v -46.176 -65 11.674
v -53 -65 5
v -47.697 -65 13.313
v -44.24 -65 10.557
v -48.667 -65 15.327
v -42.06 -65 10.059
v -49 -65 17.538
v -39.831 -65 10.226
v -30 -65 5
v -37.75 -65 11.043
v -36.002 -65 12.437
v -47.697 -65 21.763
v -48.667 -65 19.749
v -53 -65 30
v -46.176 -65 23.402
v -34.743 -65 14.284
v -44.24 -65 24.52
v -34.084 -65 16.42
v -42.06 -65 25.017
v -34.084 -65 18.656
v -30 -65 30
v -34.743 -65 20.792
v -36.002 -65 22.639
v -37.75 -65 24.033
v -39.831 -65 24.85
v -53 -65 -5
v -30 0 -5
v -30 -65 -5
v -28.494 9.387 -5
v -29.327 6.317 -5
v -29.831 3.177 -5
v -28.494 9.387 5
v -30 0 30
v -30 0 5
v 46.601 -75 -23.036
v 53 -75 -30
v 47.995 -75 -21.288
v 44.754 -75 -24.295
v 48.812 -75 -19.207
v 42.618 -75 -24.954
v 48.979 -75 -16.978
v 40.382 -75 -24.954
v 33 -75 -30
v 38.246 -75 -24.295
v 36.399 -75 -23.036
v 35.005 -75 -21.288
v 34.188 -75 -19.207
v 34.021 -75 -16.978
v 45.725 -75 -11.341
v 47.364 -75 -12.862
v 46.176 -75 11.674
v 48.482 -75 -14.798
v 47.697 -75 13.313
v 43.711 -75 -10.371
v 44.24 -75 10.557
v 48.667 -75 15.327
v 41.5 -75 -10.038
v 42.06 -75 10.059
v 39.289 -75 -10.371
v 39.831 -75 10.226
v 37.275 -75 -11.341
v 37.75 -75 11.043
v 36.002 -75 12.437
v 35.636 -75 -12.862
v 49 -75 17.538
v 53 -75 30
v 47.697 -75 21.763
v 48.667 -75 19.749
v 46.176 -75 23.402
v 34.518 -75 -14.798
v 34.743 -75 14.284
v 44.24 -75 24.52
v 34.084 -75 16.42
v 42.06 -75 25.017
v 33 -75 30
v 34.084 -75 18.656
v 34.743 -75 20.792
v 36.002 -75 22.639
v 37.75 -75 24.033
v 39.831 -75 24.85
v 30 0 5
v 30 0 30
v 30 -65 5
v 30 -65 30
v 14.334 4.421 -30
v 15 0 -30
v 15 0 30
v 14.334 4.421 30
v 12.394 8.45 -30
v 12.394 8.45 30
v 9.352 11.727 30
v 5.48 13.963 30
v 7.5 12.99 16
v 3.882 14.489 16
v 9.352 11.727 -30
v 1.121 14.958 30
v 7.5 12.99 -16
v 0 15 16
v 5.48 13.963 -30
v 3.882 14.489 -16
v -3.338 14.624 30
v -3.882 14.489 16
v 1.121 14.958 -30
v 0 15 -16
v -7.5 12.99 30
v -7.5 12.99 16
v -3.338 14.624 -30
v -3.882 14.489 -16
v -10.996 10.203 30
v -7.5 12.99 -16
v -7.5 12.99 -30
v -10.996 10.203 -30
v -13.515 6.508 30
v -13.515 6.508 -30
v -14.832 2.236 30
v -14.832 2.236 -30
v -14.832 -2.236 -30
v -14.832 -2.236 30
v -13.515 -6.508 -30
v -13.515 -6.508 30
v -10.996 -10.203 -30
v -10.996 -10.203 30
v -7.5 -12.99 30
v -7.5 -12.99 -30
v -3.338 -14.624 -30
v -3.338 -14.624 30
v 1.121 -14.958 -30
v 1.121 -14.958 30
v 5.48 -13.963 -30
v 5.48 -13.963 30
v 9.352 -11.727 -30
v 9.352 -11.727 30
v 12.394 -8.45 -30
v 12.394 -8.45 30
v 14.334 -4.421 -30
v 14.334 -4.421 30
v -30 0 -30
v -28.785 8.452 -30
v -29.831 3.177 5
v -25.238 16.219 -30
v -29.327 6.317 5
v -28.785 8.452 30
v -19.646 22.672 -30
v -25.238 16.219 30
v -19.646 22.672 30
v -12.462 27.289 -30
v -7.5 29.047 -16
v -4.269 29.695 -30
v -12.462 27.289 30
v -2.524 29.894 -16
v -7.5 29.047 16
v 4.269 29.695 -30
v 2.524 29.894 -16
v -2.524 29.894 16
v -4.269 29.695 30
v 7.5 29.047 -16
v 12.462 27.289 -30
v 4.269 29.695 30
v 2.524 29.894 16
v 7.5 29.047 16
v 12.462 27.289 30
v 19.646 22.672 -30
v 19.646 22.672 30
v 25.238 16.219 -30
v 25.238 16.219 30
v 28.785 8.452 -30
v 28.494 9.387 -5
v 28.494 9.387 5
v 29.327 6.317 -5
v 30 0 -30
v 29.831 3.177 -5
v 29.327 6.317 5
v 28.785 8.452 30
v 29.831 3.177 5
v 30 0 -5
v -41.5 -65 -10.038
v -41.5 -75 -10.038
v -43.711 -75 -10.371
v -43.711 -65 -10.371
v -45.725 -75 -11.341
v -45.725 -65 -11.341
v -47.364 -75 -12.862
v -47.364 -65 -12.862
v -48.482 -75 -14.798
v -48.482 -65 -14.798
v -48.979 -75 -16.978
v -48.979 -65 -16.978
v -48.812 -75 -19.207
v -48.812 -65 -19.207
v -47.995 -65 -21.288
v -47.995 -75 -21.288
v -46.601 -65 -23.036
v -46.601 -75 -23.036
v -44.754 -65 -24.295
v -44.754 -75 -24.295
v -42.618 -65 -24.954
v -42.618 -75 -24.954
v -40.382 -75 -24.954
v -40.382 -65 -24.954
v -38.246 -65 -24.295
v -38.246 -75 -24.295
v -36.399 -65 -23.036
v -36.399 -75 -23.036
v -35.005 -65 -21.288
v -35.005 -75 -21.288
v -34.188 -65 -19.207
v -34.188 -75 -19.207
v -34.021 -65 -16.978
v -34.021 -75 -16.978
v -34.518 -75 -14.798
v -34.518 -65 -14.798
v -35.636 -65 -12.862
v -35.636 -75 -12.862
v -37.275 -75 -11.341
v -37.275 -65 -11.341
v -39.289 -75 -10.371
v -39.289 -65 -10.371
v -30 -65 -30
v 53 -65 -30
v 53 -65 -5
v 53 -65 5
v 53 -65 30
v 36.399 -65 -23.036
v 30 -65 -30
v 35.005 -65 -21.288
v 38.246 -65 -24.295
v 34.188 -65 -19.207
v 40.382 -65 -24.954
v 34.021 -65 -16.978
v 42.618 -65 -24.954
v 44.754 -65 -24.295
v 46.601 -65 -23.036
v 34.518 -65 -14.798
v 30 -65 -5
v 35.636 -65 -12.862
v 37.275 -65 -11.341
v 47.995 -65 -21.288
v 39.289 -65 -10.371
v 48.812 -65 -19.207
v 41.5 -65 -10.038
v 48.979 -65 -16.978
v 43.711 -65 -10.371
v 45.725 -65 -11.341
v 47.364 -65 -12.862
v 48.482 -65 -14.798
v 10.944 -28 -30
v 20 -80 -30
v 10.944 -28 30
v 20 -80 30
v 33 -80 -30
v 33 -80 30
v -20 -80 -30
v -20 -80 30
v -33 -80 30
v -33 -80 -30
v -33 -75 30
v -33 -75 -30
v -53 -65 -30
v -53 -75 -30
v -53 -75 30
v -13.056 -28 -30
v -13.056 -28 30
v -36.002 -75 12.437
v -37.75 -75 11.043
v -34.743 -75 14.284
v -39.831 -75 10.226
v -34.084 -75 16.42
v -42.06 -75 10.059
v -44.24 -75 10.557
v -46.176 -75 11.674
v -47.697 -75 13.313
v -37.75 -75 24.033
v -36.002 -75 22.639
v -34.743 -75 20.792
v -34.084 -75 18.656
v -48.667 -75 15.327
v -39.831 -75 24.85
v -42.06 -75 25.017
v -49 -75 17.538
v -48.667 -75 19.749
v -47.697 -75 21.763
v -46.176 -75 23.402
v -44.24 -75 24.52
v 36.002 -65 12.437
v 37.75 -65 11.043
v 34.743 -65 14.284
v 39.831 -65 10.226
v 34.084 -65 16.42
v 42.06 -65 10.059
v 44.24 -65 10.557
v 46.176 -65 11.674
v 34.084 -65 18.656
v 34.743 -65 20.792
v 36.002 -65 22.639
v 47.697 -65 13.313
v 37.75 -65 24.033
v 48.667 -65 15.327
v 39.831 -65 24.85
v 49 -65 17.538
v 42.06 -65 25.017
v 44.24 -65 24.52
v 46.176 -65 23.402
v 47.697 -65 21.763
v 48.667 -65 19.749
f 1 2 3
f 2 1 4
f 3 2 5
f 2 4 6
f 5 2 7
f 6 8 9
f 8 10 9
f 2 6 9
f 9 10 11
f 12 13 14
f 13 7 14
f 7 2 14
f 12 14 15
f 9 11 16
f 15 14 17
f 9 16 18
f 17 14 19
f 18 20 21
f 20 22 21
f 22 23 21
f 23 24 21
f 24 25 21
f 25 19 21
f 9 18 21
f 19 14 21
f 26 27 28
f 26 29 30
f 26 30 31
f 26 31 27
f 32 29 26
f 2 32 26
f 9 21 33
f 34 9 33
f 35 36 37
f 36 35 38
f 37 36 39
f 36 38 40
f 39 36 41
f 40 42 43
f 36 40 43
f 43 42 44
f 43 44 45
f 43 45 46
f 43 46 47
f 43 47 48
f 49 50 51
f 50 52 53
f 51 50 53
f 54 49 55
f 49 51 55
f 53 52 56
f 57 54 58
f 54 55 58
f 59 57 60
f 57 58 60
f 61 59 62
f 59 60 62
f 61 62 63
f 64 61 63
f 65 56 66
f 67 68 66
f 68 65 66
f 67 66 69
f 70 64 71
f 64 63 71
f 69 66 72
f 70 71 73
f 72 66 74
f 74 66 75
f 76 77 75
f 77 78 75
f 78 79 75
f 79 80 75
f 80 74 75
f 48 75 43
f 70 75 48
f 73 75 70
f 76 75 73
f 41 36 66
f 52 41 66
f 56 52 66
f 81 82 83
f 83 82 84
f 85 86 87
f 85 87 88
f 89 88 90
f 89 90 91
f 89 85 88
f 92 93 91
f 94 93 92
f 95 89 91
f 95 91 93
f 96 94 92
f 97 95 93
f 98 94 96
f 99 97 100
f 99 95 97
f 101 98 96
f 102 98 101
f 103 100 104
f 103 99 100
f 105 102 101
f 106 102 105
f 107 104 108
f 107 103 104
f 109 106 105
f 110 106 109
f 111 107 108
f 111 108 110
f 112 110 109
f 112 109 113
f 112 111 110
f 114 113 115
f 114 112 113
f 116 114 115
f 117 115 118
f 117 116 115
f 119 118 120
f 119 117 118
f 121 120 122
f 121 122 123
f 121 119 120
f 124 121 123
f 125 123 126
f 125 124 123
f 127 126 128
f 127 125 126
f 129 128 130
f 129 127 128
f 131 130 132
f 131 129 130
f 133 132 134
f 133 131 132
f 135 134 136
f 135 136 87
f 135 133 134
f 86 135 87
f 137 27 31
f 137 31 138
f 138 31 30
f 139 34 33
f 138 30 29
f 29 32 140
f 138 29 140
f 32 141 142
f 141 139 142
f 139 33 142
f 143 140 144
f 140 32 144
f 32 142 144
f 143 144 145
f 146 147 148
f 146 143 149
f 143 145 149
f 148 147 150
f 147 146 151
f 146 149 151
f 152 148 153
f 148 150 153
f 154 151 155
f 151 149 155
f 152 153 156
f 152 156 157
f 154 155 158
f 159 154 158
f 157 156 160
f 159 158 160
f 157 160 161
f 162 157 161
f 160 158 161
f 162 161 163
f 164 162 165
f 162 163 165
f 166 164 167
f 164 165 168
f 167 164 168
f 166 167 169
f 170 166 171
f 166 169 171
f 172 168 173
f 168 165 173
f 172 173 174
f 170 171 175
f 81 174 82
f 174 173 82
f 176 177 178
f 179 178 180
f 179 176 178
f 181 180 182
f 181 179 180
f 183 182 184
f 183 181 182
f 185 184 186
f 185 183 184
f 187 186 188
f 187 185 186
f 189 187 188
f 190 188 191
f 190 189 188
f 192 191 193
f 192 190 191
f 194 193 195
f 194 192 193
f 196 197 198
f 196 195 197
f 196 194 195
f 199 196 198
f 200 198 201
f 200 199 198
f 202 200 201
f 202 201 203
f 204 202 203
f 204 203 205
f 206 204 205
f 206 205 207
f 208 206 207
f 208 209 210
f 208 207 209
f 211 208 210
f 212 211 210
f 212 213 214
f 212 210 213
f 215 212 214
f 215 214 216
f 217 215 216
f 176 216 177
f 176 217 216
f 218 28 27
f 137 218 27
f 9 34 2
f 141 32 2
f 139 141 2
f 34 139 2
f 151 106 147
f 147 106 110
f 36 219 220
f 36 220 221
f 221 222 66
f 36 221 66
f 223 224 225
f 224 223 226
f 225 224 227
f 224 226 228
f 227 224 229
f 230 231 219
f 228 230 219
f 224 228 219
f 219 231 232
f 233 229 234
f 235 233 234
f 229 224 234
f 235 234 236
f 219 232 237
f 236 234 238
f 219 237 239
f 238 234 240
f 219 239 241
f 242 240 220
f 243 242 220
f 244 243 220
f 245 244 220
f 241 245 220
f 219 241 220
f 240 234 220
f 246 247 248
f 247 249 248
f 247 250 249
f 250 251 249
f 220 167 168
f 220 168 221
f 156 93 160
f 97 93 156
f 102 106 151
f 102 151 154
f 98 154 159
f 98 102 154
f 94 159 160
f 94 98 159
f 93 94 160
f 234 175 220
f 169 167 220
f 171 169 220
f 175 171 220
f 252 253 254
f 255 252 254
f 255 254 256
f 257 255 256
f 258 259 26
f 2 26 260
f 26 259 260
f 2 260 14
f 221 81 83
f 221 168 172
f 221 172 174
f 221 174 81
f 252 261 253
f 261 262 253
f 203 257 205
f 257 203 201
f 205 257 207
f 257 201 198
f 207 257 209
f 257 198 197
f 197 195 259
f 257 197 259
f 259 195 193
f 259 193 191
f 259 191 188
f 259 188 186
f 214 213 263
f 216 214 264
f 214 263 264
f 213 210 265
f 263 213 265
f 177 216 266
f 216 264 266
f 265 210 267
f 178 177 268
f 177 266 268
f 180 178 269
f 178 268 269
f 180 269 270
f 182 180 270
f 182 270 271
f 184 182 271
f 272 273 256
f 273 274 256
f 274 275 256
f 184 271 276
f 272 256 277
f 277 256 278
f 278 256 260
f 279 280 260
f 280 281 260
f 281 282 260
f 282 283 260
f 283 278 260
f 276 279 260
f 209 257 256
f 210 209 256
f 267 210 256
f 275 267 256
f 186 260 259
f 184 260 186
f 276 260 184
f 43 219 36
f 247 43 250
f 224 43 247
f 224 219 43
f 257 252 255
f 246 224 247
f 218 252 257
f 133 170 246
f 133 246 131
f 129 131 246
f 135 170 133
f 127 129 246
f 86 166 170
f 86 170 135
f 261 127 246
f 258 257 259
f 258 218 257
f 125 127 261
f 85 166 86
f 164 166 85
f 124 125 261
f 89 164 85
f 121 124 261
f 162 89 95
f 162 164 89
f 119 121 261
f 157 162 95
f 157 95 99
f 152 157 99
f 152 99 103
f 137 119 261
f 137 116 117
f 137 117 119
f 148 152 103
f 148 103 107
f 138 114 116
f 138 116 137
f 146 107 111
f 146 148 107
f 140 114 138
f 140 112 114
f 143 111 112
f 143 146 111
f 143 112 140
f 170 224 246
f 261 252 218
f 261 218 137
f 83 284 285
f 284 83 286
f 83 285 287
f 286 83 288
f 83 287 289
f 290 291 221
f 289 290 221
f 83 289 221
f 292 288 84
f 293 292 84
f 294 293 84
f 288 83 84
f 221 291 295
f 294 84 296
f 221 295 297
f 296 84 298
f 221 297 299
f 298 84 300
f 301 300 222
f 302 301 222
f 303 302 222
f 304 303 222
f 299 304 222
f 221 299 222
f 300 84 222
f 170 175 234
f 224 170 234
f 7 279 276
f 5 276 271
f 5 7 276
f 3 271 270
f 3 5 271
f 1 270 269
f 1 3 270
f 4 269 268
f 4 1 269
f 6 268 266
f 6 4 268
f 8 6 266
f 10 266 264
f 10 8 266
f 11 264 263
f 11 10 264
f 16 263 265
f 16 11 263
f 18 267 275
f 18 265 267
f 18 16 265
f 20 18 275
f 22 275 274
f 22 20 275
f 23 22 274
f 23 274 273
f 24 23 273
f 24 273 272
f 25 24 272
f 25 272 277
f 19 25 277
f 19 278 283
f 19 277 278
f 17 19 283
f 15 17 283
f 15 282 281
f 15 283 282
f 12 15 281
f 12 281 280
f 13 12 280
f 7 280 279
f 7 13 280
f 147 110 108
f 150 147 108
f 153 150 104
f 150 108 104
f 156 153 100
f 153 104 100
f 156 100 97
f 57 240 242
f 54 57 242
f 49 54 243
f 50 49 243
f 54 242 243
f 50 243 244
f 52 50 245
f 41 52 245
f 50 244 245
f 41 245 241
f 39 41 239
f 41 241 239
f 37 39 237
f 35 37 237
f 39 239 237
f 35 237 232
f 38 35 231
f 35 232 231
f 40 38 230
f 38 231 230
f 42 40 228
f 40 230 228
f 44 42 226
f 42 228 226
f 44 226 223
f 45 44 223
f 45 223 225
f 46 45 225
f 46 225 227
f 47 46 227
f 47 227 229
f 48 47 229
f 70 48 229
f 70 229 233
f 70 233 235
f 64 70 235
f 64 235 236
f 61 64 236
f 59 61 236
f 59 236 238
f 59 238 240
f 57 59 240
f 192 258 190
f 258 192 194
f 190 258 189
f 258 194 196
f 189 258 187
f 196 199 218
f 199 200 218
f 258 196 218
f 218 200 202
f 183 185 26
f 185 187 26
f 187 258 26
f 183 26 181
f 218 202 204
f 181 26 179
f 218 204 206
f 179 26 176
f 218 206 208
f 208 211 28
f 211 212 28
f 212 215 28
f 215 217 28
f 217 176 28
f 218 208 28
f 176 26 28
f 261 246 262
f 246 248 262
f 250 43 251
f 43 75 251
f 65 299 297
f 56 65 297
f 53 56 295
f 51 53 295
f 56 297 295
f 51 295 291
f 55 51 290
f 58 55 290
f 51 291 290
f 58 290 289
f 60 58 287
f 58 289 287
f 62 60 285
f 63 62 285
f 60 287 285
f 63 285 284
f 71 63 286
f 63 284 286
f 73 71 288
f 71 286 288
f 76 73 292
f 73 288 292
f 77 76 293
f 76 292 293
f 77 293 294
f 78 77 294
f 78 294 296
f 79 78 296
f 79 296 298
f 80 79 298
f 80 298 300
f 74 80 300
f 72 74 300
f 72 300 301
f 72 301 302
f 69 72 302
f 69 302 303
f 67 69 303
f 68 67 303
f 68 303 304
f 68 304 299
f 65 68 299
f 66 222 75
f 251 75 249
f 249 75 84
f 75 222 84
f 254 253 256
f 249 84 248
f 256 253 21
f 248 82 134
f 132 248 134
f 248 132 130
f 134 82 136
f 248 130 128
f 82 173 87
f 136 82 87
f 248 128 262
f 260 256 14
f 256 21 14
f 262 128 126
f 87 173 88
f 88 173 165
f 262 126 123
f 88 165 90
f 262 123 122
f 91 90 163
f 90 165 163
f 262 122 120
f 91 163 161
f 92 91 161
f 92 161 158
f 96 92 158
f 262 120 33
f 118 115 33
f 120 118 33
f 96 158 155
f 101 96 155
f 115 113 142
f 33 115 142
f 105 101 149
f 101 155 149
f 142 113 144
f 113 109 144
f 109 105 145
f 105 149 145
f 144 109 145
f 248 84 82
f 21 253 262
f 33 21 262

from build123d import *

# Parameters (mm, degrees)
SKETCH1_R           = 15
BOSS_EXTRUDE1_DEPTH = 30
SKETCH2_R           = 7.5
CUT_EXTRUDE1_DEPTH  = 60
SKETCH3_W           = 15
SKETCH3_H           = 32
CUT_EXTRUDE2_DEPTH  = 101.543522914
RIB1_REACH          = 102.544
SKETCH4_WALL_W      = 281.406902826
SKETCH4_WALL_H      = 10


with BuildPart() as part:
    # Sketch1 → Boss-Extrude1 (new, symmetric)
    with BuildSketch(Plane.XY):
        with BuildLine():
            Line((30, 0), (30, -65))
            Line((30, -65), (53, -65))
            Line((53, -65), (53, -75))
            Line((53, -75), (33, -75))
            Line((33, -75), (33, -80))
            Line((33, -80), (20, -80))
            Line((20, -80), (10.9437787, -28))
            Line((10.9437787, -28), (-13.0562213, -28))
            Line((-13.0562213, -28), (-20, -80))
            Line((-20, -80), (-33, -80))
            Line((-33, -80), (-33, -75))
            Line((-33, -75), (-53, -75))
            Line((-53, -75), (-53, -65))
            Line((-53, -65), (-30, -65))
            Line((-30, -65), (-30, 0))
            ThreePointArc((-30, 0), (0, 30), (30, 0))
        make_face()
        Circle(SKETCH1_R, mode=Mode.SUBTRACT)
    extrude(amount=BOSS_EXTRUDE1_DEPTH, both=True)

    # Sketch2 → Cut-Extrude1 (cut)
    with BuildSketch(Plane(origin=(0, -65, 0), x_dir=(1, 0, 0), z_dir=(0, 1, 0))):
        with Locations(Location((41.5, 17.538074841, 0), (0, 0, 270))):
            Circle(SKETCH2_R)
        with Locations((41.5, -17.538074841)):
            Circle(SKETCH2_R)
    cut_extrude1 = extrude(amount=-CUT_EXTRUDE1_DEPTH, mode=Mode.SUBTRACT)

    # Mirror1: Cut-Extrude1 across plane
    add(cut_extrude1.mirror(Plane(origin=(0, 0, 0), x_dir=(0, 0, 1), z_dir=(1, 0, 0))), mode=Mode.SUBTRACT)

    # Sketch3 → Cut-Extrude2 (cut, through all)
    with BuildSketch(Plane(origin=(0, 0, 0), x_dir=(1, 0, 0), z_dir=(0, 1, 0))):
        Rectangle(SKETCH3_W, SKETCH3_H)
    extrude(amount=CUT_EXTRUDE2_DEPTH, mode=Mode.SUBTRACT)

    # Sketch4 wall → Rib1 (add, up to next)
    with BuildSketch(Plane(origin=(-40.746781429, -27.806470527, 0), x_dir=(-0.312901964861, -0.949785428603, 0), z_dir=(0.949785428603, -0.312901964861, 0)), mode=Mode.PRIVATE) as rib1_sk1:
        Rectangle(SKETCH4_WALL_W, SKETCH4_WALL_H)
    rib1_tool1 = extrude(rib1_sk1.sketch, amount=RIB1_REACH, mode=Mode.PRIVATE) - part.part
    rib1 = rib1_tool1.solids().sort_by_distance((-40.746781429, -27.806470527, 0))[0]
    add(rib1)

    # Mirror2: Rib1 across plane
    add(rib1.mirror(Plane(origin=(0, 0, 0), x_dir=(0, 0, 1), z_dir=(1, 0, 0))))


solid = part.part
